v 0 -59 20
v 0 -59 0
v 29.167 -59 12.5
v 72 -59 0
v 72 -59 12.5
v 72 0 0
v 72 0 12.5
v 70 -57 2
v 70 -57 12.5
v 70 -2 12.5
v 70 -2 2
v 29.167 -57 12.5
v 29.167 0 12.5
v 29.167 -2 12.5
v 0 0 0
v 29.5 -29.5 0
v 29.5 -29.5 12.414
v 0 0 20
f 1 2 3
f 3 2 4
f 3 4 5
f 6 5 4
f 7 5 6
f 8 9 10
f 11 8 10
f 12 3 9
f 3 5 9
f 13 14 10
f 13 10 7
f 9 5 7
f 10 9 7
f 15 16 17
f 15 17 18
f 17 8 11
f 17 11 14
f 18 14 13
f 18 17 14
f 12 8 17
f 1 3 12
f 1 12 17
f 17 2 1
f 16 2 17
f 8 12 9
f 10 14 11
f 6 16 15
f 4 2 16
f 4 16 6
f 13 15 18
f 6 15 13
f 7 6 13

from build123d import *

# Parameters (mm, degrees)
F3_DEPTH  = 59
F4_W      = 59
F4_H      = 12.5
F5_DEPTH  = 2
F6_W      = 65
F6_H      = 12.5
F7_DEPTH  = 2
F8_W      = 65
F8_H      = 12.5
F9_DEPTH  = 2
F11_DEPTH = 25


with BuildPart() as f3:
    # F2 (on offset) → F3 (new body)
    with BuildSketch(Plane.XZ.offset(59)):
        Polygon((0, 20), (0, 0), (70, 0), (70, 2), align=None)
    extrude(amount=-F3_DEPTH)

    # F4 (on offset) → F5 (join)
    with BuildSketch(Plane.YZ.offset(72)):
        with Locations((-29.5, 6.25)):
            Rectangle(F4_W, F4_H)
    extrude(amount=-F5_DEPTH)

    # F6 (on Front) → F7 (join)
    with BuildSketch(Plane.XZ):
        with Locations((39.109939, 6.25)):
            Rectangle(F6_W, F6_H)
    extrude(amount=F7_DEPTH)

    # F8 (on offset) → F9 (join)
    with BuildSketch(Plane.XZ.offset(59)):
        with Locations((39.260793, 6.25)):
            Rectangle(F8_W, F8_H)
    extrude(amount=-F9_DEPTH)

    # F10 (on Top) → F11 (cut)
    with BuildSketch(Plane.XY):
        Polygon((29.5, -29.5), (0, 0), (0, -59), align=None)
    extrude(amount=F11_DEPTH, mode=Mode.SUBTRACT)


solid = f3.part
